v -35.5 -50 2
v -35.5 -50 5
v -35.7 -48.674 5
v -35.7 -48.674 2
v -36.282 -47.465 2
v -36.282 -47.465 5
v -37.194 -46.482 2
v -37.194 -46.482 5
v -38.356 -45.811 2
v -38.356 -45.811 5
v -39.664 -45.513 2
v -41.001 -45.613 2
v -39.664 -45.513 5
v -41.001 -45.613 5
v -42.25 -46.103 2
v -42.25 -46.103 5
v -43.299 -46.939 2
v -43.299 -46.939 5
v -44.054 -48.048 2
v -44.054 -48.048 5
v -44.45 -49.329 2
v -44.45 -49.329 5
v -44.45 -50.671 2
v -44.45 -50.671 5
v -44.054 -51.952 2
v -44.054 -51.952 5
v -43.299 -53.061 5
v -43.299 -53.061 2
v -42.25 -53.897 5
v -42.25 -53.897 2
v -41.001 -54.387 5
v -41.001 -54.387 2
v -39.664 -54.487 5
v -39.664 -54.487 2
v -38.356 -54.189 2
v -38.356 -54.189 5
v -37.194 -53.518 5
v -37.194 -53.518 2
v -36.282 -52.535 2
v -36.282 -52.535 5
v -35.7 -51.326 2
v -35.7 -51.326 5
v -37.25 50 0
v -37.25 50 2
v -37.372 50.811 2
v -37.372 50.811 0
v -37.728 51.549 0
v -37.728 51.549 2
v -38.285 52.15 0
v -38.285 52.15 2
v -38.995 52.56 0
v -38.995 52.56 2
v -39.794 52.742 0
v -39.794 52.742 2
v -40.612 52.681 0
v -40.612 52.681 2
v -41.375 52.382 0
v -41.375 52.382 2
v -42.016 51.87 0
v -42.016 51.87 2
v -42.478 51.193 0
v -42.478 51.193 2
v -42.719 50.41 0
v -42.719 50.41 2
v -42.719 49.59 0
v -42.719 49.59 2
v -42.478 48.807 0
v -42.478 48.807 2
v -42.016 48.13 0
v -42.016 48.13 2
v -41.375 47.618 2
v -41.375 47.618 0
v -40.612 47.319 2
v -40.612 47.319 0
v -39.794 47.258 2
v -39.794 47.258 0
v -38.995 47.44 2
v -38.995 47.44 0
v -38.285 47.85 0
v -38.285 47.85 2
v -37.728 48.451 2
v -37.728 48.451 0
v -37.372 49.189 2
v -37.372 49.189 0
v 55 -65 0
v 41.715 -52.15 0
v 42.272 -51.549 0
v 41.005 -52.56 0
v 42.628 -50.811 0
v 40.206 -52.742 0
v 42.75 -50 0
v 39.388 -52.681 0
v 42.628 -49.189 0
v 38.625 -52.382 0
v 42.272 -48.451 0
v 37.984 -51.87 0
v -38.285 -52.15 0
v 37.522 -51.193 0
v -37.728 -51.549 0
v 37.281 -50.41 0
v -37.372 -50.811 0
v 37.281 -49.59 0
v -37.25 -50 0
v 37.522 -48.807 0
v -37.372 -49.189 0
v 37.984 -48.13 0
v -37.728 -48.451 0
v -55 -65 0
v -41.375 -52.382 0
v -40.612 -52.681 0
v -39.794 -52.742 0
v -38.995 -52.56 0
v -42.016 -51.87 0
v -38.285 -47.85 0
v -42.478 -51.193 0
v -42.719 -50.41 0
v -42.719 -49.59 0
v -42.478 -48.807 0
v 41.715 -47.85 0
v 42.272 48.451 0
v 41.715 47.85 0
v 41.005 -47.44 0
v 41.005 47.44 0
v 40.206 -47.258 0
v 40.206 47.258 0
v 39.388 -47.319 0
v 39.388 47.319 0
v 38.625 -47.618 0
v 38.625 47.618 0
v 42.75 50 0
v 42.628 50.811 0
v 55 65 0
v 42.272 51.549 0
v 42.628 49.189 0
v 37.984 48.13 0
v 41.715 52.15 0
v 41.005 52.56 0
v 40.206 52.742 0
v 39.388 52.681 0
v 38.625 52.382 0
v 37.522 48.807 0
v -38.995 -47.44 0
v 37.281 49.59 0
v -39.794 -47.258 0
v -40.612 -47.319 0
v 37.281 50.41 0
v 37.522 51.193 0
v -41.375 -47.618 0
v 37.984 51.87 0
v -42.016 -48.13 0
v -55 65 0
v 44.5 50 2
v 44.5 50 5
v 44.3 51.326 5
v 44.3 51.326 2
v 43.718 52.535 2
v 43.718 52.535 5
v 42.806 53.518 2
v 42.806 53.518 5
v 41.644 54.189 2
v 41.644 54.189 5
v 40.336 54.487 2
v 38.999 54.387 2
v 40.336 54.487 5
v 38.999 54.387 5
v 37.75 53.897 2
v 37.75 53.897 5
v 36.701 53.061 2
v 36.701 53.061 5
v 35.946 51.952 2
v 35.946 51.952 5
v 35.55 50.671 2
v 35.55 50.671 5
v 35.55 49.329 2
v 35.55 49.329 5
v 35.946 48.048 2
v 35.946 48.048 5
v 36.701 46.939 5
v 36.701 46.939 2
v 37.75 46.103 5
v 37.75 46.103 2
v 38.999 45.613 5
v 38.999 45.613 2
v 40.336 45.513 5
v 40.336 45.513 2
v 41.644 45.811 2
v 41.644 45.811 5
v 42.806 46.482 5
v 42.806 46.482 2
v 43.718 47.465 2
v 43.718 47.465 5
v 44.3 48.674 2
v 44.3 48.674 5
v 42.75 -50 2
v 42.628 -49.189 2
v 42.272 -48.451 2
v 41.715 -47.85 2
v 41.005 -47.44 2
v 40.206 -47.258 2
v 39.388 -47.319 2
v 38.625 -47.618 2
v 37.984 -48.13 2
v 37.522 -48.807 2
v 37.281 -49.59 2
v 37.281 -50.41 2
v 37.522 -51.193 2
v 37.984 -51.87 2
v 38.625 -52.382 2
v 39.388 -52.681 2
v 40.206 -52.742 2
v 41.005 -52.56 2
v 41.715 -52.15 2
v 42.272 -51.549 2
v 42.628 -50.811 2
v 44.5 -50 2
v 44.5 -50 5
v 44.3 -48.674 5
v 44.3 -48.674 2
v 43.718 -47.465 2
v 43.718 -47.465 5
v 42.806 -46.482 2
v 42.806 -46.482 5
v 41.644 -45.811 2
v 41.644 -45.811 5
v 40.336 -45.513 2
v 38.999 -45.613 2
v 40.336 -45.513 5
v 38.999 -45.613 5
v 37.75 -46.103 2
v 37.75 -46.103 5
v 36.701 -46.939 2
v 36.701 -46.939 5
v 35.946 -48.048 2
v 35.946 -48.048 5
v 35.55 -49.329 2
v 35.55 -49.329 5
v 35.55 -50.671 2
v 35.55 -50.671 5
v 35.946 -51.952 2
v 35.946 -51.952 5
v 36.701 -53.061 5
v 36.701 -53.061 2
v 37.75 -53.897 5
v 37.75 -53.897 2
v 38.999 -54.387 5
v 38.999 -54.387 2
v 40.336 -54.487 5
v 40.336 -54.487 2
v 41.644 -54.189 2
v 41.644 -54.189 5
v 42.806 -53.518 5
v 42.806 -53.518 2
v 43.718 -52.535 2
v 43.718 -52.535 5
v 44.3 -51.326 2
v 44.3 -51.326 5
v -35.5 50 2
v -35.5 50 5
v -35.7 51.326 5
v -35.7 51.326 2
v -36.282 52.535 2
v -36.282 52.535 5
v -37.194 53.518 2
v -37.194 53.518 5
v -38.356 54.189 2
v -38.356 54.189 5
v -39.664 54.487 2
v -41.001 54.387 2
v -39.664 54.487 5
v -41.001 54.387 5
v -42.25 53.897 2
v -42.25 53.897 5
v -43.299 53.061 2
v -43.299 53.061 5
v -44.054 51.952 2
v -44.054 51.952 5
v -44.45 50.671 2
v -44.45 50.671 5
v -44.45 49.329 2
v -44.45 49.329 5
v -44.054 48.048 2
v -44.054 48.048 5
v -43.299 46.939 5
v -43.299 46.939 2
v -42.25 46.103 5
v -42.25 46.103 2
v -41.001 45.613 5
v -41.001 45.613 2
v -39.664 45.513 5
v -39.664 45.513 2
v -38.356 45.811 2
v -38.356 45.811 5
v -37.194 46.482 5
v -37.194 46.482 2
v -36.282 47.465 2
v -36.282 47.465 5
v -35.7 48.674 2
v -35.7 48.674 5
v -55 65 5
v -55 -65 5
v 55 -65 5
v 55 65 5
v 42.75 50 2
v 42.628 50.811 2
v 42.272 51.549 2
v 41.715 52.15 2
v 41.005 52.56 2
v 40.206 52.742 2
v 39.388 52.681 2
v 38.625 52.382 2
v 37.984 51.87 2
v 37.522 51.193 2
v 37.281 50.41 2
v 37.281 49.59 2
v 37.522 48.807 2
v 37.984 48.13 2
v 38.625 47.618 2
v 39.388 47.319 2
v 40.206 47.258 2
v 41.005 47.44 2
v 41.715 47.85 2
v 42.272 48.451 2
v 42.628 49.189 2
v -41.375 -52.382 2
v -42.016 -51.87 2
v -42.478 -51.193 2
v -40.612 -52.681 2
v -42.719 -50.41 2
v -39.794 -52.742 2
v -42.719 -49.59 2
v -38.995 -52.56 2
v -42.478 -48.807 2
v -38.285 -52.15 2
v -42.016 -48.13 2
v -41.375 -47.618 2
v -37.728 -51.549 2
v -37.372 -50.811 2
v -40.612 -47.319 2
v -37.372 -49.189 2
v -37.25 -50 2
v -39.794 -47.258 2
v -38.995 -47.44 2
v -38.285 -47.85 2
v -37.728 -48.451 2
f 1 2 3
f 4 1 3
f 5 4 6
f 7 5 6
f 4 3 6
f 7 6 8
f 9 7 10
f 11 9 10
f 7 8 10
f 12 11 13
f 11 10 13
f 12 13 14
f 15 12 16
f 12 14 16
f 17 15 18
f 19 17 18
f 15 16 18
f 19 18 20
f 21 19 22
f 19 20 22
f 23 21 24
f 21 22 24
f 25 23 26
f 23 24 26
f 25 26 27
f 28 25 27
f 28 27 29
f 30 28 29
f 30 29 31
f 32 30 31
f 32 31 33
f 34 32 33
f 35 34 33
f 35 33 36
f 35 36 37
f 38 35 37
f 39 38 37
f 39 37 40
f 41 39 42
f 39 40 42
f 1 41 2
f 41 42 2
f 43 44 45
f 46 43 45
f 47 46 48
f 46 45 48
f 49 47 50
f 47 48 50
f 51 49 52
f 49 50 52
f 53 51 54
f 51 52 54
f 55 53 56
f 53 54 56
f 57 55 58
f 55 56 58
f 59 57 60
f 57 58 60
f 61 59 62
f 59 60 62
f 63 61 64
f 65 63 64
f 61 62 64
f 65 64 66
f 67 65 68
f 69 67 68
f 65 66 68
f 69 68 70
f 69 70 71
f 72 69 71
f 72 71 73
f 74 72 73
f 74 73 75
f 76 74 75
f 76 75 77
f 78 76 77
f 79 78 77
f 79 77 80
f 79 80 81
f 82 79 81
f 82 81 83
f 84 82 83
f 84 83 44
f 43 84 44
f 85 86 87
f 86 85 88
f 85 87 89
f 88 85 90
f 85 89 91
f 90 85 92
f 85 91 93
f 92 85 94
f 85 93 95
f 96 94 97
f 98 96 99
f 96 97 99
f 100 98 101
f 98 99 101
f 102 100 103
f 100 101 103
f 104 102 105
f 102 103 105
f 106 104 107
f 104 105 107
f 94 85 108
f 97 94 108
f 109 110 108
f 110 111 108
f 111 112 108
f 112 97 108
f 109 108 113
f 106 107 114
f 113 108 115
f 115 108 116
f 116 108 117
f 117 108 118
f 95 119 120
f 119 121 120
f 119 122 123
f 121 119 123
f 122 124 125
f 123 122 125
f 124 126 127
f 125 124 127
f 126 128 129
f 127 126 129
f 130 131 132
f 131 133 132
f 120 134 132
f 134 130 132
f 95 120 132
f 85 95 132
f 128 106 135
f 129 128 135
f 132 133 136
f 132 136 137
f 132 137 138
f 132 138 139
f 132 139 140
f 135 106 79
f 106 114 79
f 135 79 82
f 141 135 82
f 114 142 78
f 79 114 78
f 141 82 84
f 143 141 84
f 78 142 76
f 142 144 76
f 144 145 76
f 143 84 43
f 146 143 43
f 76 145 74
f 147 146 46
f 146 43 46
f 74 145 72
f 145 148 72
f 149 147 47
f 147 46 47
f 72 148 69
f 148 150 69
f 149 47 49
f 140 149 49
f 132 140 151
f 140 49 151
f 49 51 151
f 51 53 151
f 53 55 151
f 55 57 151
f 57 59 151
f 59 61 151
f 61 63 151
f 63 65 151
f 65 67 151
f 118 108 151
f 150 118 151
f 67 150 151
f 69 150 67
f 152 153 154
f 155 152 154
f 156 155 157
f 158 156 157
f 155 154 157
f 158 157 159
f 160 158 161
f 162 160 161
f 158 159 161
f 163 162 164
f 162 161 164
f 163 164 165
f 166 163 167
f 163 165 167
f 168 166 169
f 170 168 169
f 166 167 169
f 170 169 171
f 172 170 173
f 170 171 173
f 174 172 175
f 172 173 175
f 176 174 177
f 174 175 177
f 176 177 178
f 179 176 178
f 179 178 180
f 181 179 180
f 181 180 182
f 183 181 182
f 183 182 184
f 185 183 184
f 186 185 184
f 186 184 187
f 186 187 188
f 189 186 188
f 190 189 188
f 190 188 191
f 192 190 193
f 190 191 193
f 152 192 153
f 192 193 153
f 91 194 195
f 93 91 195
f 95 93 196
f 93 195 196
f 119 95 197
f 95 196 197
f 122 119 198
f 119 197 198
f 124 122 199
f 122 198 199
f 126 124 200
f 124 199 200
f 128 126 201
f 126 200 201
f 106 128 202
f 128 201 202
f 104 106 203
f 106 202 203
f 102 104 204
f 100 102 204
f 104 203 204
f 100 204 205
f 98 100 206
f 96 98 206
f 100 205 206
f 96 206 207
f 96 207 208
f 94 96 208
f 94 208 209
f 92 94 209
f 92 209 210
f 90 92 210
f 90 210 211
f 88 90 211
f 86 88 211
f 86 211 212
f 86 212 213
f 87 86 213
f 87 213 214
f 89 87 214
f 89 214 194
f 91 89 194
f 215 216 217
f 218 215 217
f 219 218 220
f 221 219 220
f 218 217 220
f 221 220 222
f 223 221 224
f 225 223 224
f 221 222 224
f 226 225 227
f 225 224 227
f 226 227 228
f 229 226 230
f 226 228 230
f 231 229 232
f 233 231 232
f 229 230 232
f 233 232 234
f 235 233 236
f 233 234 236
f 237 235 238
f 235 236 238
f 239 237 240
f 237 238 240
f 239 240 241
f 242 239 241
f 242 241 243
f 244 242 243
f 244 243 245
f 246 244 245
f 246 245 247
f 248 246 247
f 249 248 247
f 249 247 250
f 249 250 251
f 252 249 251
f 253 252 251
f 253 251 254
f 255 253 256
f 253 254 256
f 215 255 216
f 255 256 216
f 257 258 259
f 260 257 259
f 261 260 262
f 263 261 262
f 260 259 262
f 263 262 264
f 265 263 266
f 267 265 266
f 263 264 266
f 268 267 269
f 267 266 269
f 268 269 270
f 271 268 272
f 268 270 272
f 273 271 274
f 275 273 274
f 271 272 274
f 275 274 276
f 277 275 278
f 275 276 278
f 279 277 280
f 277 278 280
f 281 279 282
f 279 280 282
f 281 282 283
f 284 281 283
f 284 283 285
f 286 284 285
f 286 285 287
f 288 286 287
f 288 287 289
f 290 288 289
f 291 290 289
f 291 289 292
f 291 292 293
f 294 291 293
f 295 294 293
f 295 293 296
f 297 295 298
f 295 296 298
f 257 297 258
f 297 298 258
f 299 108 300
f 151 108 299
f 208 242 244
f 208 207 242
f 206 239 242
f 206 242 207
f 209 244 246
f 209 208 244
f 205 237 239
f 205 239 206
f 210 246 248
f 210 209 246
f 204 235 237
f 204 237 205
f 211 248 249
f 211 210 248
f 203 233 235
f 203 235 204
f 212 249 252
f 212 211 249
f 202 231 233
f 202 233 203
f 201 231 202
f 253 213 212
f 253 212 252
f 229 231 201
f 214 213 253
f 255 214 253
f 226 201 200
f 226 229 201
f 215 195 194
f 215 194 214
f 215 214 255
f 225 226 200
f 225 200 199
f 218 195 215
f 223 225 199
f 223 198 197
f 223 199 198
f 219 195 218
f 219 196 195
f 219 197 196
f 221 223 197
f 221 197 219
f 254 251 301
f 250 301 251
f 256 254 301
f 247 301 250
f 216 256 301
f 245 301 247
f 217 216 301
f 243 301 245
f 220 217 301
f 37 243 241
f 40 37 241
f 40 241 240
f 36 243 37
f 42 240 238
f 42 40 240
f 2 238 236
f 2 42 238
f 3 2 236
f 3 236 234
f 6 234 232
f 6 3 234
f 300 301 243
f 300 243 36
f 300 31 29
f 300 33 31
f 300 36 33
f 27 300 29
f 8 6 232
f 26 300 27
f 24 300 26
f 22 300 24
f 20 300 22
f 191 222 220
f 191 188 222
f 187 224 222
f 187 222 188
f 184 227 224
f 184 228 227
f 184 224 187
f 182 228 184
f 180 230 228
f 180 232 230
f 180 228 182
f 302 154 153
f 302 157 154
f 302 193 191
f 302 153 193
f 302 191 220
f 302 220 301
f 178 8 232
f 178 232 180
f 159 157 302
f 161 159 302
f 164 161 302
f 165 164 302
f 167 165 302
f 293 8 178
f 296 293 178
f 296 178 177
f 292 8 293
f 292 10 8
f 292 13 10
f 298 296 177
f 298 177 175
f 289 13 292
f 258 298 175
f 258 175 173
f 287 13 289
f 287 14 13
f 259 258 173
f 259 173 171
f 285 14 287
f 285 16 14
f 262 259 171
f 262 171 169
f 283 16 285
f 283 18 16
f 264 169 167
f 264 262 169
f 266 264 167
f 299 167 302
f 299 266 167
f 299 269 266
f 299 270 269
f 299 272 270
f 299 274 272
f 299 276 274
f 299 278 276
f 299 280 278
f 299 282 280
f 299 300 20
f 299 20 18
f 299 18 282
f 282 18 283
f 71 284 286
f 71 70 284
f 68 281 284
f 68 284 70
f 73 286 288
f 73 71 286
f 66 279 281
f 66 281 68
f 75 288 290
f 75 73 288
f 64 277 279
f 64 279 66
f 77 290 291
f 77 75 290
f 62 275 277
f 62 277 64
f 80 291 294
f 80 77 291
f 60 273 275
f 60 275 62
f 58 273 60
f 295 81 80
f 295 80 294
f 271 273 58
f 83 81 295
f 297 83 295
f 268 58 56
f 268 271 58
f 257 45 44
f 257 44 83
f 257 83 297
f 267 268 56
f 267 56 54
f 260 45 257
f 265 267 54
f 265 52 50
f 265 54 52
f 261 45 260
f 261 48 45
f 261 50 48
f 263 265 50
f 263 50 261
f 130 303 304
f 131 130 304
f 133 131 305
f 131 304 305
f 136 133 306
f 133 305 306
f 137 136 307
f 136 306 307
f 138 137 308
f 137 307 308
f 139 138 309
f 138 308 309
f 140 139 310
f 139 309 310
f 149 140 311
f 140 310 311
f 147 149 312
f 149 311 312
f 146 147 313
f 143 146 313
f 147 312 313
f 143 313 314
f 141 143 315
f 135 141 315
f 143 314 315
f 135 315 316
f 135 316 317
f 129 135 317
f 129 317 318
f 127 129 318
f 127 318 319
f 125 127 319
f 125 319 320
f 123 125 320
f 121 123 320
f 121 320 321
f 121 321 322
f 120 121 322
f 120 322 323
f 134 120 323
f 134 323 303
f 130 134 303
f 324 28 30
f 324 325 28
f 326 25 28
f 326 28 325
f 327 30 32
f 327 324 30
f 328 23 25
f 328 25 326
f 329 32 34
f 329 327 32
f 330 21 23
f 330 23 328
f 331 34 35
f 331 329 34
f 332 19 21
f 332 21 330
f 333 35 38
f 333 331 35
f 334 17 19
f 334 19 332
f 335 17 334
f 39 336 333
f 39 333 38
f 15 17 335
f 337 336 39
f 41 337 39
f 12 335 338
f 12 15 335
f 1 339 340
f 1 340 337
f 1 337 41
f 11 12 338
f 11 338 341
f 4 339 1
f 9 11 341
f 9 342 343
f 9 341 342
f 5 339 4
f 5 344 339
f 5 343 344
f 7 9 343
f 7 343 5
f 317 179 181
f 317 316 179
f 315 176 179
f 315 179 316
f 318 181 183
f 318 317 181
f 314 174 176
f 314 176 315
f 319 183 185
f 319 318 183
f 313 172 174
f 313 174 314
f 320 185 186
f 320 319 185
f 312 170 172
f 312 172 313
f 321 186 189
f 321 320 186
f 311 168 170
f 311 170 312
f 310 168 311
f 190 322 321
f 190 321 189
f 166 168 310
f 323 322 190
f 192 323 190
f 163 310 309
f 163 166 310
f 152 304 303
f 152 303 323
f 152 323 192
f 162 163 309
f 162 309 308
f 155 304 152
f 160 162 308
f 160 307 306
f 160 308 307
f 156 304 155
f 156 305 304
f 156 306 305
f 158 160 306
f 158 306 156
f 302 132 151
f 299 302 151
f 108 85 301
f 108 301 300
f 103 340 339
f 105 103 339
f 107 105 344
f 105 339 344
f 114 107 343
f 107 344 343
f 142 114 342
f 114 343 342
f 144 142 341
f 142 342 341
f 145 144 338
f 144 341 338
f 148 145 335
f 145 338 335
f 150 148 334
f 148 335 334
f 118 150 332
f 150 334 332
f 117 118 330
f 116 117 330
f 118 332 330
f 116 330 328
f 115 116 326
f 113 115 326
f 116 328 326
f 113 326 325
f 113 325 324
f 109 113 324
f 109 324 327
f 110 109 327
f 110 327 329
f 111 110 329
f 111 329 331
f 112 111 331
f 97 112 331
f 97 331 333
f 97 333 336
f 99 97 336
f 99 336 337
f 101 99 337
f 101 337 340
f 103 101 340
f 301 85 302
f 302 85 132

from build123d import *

# Parameters (mm, degrees)
SKETCH1_W           = 130
SKETCH1_H           = 110
BOSS_EXTRUDE1_DEPTH = 5
SKETCH3_R           = 2.75
CUT_EXTRUDE1_DEPTH  = 86.293610546
SKETCH4_R           = 4.5
CUT_EXTRUDE2_DEPTH  = 3


with BuildPart() as part:
    # Sketch1 → Boss-Extrude1 (new body)
    with BuildSketch(Plane(origin=(0, 0, 0), x_dir=(0, 1, 0), z_dir=(0, 0, 1))):
        Rectangle(SKETCH1_W, SKETCH1_H)
    extrude(amount=BOSS_EXTRUDE1_DEPTH)

    # Sketch3 → Cut-Extrude1 (cut, through all)
    with BuildSketch(Plane.XY.offset(5)):
        with Locations((-40, 50)):
            Circle(SKETCH3_R)
        with Locations((40, -50)):
            Circle(SKETCH3_R)
        with Locations((-40, -50)):
            Circle(SKETCH3_R)
        with Locations((40, 50)):
            Circle(SKETCH3_R)
    extrude(amount=-CUT_EXTRUDE1_DEPTH, mode=Mode.SUBTRACT)

    # Sketch4 → Cut-Extrude2 (cut)
    with BuildSketch(Plane.XY.offset(5)):
        with Locations((-40, 50)):
            Circle(SKETCH4_R)
        with Locations((40, 50)):
            Circle(SKETCH4_R)
        with Locations((40, -50)):
            Circle(SKETCH4_R)
        with Locations((-40, -50)):
            Circle(SKETCH4_R)
    extrude(amount=-CUT_EXTRUDE2_DEPTH, mode=Mode.SUBTRACT)


solid = part.part
